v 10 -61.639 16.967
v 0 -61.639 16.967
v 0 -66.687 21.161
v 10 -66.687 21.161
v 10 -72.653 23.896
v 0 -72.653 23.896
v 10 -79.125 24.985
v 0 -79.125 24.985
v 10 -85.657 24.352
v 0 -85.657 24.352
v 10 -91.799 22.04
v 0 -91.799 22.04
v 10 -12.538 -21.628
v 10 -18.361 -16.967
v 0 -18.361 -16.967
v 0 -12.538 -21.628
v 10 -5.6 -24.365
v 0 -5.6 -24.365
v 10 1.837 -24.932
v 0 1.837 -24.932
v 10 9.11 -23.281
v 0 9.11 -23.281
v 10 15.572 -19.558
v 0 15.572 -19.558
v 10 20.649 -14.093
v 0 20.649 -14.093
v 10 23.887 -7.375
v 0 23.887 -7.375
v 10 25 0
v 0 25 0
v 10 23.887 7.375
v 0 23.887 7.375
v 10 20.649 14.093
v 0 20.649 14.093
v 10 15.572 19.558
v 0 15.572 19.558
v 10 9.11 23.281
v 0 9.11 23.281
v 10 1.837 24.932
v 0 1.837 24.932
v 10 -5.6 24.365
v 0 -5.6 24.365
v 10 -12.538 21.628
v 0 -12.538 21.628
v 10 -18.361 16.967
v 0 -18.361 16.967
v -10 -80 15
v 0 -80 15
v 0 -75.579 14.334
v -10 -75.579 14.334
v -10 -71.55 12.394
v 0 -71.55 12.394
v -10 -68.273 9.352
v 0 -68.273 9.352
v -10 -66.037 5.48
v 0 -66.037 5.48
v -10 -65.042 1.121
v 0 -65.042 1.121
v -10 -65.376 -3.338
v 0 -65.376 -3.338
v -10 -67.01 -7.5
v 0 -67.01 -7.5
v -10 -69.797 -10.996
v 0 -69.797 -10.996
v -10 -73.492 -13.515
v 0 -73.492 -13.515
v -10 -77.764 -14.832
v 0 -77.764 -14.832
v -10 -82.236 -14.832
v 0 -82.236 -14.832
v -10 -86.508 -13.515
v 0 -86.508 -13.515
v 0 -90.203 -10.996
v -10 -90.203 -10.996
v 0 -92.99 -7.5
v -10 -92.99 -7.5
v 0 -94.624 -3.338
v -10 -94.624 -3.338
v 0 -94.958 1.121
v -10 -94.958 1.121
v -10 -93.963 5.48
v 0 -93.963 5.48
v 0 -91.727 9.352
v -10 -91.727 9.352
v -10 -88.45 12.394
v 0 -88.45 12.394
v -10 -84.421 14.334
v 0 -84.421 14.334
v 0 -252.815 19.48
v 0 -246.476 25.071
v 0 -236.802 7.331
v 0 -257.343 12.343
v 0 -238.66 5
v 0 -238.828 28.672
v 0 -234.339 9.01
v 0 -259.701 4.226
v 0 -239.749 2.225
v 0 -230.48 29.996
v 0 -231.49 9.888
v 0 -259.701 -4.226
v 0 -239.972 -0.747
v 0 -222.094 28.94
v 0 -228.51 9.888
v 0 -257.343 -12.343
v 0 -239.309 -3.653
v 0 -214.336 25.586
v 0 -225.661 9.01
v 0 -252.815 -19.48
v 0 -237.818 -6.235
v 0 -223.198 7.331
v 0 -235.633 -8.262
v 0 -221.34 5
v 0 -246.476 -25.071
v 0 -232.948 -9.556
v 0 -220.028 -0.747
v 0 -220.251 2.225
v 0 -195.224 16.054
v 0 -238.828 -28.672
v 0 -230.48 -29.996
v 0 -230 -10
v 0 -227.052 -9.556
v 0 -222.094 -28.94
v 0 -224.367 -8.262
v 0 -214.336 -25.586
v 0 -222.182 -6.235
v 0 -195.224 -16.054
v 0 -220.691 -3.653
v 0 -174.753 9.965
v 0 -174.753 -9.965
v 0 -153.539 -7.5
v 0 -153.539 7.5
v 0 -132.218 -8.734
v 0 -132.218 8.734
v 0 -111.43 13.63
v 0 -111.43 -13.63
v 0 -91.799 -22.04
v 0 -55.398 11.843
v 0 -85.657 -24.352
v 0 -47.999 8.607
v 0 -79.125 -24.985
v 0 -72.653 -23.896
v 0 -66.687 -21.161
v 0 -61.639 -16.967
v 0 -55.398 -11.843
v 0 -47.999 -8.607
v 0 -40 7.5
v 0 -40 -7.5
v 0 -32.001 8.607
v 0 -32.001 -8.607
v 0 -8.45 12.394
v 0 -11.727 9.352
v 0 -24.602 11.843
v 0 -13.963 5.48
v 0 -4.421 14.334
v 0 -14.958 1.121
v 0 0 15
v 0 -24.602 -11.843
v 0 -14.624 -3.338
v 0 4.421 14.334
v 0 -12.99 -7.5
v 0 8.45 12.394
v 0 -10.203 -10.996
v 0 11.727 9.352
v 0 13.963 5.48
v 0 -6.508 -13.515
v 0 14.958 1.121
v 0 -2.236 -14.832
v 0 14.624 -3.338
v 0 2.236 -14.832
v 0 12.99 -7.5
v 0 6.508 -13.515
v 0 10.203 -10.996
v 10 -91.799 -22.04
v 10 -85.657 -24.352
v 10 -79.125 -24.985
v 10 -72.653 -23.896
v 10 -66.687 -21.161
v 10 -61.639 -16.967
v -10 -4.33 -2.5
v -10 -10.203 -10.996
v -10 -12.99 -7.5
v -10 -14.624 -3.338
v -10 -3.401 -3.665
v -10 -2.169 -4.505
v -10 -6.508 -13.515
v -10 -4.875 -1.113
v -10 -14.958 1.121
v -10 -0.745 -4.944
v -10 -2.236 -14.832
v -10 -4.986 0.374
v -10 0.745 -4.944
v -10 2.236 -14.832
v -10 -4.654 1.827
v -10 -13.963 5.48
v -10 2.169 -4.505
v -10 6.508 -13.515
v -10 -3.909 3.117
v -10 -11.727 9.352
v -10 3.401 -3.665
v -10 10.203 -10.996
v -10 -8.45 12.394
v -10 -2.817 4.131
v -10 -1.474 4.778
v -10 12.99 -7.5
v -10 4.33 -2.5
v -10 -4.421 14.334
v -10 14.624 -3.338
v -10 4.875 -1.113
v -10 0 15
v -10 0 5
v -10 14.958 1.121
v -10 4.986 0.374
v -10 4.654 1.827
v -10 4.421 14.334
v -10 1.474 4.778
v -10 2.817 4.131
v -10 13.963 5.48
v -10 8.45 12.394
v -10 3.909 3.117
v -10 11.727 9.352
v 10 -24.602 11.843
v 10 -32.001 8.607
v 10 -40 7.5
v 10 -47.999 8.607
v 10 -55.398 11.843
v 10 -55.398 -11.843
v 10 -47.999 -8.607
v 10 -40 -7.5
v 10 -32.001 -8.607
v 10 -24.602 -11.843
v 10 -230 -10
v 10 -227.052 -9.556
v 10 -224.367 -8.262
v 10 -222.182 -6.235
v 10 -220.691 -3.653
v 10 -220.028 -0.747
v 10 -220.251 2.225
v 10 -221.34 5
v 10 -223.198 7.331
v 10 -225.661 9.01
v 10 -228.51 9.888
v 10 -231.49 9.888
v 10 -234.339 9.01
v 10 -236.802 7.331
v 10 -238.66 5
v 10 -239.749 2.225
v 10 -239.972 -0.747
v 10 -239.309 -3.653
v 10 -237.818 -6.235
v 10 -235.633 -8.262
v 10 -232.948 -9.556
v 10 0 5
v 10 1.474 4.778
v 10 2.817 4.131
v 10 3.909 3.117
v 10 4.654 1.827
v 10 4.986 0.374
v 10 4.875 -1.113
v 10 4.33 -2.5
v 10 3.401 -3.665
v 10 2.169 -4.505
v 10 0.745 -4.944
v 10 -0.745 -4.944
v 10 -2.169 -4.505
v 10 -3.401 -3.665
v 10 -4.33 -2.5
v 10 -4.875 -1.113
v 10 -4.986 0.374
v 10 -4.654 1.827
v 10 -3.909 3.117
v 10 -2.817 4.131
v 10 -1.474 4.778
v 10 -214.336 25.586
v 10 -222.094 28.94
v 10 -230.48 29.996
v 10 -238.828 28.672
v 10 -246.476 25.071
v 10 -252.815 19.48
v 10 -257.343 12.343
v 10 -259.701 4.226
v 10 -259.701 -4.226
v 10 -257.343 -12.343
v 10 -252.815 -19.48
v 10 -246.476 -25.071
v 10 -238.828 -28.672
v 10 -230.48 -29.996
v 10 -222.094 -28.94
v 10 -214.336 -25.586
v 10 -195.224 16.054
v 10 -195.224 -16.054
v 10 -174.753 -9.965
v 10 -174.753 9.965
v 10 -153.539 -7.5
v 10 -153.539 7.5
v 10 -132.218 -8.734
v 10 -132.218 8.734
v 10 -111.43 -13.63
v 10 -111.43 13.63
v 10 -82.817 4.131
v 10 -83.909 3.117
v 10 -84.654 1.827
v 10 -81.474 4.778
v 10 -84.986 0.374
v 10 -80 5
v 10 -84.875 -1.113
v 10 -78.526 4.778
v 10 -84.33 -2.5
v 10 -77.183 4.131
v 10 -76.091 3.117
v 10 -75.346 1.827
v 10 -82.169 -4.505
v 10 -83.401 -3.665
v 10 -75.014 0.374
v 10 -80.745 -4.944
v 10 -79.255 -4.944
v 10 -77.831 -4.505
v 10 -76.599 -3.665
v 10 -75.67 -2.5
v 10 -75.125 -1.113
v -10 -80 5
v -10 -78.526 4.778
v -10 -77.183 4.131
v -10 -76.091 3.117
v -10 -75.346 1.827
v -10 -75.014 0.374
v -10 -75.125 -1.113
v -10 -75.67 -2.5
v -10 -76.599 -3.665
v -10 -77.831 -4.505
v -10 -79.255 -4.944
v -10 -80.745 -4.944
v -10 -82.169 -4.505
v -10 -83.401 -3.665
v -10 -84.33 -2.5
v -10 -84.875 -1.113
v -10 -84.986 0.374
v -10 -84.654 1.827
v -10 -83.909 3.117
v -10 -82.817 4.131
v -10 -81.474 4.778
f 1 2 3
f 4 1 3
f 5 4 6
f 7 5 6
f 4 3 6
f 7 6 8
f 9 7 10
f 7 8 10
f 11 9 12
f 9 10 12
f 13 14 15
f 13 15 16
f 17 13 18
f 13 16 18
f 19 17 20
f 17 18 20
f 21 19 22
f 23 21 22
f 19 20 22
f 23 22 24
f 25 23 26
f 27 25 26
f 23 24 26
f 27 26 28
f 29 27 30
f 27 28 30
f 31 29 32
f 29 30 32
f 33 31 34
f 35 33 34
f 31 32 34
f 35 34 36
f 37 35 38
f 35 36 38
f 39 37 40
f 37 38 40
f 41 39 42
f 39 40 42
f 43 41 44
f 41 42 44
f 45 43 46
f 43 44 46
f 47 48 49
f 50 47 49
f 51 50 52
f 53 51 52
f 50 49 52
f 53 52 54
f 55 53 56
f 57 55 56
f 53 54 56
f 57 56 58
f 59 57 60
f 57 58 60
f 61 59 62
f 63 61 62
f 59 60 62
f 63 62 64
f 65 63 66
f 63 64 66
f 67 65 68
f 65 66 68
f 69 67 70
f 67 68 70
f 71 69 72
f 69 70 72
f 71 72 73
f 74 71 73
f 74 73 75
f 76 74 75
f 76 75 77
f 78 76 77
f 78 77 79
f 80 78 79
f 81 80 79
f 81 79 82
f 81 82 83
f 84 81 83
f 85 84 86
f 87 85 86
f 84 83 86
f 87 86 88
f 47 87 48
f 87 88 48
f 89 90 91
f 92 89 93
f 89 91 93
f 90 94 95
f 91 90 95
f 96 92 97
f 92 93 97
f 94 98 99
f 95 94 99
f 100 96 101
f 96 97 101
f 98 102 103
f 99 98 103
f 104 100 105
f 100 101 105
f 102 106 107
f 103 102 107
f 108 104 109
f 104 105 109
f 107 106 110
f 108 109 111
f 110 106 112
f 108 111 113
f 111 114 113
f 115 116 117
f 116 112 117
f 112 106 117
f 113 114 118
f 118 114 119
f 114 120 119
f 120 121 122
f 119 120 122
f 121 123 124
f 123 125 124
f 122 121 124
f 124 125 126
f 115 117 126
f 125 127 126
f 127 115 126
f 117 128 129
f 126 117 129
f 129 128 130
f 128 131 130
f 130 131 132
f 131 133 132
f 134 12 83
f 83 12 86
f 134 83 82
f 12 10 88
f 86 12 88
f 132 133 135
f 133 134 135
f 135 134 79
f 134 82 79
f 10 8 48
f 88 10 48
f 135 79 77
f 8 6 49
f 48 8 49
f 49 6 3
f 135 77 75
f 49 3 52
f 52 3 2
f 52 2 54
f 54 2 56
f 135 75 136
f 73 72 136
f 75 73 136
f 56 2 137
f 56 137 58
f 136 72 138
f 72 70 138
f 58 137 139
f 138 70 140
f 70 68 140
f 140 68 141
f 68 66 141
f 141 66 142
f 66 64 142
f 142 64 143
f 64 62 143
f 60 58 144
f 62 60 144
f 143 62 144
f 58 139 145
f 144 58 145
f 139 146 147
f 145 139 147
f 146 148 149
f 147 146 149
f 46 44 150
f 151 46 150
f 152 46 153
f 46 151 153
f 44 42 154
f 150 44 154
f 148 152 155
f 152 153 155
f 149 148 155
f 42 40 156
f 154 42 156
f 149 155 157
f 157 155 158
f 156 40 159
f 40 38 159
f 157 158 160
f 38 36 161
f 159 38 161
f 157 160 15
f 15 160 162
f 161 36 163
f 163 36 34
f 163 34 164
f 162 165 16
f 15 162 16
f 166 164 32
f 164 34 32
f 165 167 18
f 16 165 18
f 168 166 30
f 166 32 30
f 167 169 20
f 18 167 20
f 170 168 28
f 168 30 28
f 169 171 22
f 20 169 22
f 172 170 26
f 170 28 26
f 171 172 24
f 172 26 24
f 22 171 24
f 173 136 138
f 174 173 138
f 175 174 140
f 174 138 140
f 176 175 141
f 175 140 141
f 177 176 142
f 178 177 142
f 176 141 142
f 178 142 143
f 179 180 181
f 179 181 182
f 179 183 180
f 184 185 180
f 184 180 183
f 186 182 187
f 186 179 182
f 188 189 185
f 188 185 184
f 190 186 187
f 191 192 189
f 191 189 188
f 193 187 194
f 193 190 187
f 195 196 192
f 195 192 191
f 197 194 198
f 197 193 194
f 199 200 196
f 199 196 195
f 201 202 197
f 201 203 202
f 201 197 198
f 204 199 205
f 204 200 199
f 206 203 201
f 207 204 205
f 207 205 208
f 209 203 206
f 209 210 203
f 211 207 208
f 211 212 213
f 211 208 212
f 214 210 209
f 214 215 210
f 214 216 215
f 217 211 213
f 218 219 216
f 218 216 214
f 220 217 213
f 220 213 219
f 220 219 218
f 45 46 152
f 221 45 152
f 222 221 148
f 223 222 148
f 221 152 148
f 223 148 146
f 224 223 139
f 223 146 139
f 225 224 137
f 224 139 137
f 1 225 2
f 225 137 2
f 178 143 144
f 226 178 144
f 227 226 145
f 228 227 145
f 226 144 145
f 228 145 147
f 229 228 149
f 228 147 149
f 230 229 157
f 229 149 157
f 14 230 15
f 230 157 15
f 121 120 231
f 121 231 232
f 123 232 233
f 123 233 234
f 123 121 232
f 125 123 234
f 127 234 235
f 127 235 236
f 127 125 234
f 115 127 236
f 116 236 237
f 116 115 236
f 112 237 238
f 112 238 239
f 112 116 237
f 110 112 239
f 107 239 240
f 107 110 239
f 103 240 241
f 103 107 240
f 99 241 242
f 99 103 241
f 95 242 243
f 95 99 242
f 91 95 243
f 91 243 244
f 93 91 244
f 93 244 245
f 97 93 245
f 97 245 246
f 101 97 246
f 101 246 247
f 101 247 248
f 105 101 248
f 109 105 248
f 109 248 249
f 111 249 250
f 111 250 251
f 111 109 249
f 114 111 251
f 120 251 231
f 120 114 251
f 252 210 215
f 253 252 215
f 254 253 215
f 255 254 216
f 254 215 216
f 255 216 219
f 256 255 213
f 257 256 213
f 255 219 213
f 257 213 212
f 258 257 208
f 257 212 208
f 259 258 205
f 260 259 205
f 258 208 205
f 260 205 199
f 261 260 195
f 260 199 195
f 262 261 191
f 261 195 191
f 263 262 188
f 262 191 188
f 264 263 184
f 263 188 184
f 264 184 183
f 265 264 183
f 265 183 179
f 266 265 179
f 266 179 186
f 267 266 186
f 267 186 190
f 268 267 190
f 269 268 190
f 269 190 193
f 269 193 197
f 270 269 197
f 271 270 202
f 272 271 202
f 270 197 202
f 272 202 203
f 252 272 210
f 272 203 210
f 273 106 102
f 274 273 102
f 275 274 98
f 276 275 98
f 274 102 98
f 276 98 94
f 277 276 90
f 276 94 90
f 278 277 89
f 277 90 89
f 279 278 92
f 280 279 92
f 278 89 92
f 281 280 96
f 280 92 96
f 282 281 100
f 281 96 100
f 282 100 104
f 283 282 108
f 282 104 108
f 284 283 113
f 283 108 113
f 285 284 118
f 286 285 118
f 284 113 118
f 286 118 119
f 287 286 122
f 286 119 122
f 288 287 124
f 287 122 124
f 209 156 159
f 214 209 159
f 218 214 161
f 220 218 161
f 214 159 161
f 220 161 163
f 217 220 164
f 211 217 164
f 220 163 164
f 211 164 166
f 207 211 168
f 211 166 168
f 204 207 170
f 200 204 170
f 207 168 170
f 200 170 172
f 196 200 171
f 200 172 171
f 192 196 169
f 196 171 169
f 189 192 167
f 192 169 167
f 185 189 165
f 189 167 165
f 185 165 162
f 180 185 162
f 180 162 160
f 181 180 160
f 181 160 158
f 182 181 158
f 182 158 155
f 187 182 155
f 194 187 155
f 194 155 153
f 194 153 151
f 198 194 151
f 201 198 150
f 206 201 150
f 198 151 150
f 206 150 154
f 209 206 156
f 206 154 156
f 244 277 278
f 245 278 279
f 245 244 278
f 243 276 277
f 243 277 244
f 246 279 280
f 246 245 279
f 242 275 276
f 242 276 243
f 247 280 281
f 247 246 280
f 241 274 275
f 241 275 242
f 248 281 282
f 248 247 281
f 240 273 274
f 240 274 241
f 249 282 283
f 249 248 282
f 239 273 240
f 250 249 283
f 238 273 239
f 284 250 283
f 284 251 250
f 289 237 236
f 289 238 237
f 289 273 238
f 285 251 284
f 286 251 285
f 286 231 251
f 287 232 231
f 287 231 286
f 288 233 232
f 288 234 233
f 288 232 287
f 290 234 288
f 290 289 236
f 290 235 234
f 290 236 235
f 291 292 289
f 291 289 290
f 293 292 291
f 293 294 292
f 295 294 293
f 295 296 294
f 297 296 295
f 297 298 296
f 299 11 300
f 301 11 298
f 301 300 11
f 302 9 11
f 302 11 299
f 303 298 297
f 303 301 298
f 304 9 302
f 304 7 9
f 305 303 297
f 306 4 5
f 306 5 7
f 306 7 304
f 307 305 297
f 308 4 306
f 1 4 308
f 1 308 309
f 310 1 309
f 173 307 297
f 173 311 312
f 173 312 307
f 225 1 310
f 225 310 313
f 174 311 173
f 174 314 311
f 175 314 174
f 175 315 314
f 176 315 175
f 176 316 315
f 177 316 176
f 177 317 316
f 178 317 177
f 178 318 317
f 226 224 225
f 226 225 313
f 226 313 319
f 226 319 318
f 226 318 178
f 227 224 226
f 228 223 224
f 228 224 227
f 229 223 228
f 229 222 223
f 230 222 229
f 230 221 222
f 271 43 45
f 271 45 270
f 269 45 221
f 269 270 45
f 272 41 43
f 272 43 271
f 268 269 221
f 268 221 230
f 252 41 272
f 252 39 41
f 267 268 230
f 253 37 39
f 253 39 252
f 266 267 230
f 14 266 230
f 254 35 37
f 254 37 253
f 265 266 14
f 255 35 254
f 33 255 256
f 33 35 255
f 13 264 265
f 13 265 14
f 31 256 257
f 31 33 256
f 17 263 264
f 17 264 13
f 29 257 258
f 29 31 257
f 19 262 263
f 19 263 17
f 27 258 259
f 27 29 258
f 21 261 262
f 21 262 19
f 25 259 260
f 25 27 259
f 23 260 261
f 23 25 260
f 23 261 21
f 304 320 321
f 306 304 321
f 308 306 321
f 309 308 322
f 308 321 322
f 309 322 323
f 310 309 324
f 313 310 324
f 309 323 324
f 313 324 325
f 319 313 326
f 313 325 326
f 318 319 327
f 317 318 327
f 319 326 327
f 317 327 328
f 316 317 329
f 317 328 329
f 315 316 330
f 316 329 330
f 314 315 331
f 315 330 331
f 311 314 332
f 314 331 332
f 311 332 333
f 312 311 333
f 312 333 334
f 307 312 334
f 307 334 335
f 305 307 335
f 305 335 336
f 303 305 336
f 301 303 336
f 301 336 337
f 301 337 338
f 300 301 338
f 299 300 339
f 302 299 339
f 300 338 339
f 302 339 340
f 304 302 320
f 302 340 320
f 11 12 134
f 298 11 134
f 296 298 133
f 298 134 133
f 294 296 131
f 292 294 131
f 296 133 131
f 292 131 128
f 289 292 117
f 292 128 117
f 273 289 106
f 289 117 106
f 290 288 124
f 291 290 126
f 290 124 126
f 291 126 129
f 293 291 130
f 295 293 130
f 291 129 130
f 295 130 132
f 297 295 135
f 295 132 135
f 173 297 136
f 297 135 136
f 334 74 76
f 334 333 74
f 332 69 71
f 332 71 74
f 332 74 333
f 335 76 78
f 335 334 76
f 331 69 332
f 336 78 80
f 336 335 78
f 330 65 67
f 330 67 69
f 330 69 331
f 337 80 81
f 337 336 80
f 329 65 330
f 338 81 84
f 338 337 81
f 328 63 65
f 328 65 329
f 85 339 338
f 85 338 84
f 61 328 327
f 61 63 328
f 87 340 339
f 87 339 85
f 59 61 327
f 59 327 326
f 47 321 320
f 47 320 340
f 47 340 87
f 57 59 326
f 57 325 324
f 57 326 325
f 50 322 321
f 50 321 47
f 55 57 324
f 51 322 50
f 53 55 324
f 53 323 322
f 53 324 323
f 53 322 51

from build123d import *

# Parameters (mm, degrees)
SKETCH1_R           = 10
BOSS_EXTRUDE1_DEPTH = 10
SKETCH3_R           = 15
BOSS_EXTRUDE3_DEPTH = 10
SKETCH4_R           = 5
CUT_EXTRUDE1_DEPTH  = 20


with BuildPart() as part:
    # Sketch1 → Boss-Extrude1 (new body)
    with BuildSketch(Plane(origin=(0, 0, 0), x_dir=(0, 0, -1), z_dir=(1, 0, 0))):
        with BuildLine():
            ThreePointArc((16.967213115, -18.360655738), (0, 25), (-16.967213115, -18.360655738))
            ThreePointArc((-16.967213115, -18.360655738), (-7.5, -40), (-16.967213115, -61.639344262))
            ThreePointArc((-16.967213115, -61.639344262), (-24.653637732, -75.852935186), (-22.040471077, -91.799052281))
            ThreePointArc((-22.040471077, -91.799052281), (-7.5, -153.539335996), (-25.58571686, -214.33567452))
            ThreePointArc((-25.58571686, -214.33567452), (0, -260), (25.58571686, -214.33567452))
            ThreePointArc((25.58571686, -214.33567452), (7.5, -153.539335996), (22.040471077, -91.799052281))
            ThreePointArc((22.040471077, -91.799052281), (24.653637732, -75.852935186), (16.967213115, -61.639344262))
            ThreePointArc((16.967213115, -61.639344262), (7.5, -40), (16.967213115, -18.360655738))
        make_face()
        with Locations((0, -230)):
            Circle(SKETCH1_R, mode=Mode.SUBTRACT)
    extrude(amount=BOSS_EXTRUDE1_DEPTH)

    # Sketch3 → Boss-Extrude3 (add)
    with BuildSketch(Plane.ZY):
        Circle(SKETCH3_R)
        with Locations((0, -80)):
            Circle(SKETCH3_R)
    extrude(amount=BOSS_EXTRUDE3_DEPTH)

    # Sketch4 → Cut-Extrude1 (cut)
    with BuildSketch(Plane.ZY.offset(10)):
        with Locations((0, -80)):
            Circle(SKETCH4_R)
        Circle(SKETCH4_R)
    extrude(amount=-CUT_EXTRUDE1_DEPTH, mode=Mode.SUBTRACT)


solid = part.part
